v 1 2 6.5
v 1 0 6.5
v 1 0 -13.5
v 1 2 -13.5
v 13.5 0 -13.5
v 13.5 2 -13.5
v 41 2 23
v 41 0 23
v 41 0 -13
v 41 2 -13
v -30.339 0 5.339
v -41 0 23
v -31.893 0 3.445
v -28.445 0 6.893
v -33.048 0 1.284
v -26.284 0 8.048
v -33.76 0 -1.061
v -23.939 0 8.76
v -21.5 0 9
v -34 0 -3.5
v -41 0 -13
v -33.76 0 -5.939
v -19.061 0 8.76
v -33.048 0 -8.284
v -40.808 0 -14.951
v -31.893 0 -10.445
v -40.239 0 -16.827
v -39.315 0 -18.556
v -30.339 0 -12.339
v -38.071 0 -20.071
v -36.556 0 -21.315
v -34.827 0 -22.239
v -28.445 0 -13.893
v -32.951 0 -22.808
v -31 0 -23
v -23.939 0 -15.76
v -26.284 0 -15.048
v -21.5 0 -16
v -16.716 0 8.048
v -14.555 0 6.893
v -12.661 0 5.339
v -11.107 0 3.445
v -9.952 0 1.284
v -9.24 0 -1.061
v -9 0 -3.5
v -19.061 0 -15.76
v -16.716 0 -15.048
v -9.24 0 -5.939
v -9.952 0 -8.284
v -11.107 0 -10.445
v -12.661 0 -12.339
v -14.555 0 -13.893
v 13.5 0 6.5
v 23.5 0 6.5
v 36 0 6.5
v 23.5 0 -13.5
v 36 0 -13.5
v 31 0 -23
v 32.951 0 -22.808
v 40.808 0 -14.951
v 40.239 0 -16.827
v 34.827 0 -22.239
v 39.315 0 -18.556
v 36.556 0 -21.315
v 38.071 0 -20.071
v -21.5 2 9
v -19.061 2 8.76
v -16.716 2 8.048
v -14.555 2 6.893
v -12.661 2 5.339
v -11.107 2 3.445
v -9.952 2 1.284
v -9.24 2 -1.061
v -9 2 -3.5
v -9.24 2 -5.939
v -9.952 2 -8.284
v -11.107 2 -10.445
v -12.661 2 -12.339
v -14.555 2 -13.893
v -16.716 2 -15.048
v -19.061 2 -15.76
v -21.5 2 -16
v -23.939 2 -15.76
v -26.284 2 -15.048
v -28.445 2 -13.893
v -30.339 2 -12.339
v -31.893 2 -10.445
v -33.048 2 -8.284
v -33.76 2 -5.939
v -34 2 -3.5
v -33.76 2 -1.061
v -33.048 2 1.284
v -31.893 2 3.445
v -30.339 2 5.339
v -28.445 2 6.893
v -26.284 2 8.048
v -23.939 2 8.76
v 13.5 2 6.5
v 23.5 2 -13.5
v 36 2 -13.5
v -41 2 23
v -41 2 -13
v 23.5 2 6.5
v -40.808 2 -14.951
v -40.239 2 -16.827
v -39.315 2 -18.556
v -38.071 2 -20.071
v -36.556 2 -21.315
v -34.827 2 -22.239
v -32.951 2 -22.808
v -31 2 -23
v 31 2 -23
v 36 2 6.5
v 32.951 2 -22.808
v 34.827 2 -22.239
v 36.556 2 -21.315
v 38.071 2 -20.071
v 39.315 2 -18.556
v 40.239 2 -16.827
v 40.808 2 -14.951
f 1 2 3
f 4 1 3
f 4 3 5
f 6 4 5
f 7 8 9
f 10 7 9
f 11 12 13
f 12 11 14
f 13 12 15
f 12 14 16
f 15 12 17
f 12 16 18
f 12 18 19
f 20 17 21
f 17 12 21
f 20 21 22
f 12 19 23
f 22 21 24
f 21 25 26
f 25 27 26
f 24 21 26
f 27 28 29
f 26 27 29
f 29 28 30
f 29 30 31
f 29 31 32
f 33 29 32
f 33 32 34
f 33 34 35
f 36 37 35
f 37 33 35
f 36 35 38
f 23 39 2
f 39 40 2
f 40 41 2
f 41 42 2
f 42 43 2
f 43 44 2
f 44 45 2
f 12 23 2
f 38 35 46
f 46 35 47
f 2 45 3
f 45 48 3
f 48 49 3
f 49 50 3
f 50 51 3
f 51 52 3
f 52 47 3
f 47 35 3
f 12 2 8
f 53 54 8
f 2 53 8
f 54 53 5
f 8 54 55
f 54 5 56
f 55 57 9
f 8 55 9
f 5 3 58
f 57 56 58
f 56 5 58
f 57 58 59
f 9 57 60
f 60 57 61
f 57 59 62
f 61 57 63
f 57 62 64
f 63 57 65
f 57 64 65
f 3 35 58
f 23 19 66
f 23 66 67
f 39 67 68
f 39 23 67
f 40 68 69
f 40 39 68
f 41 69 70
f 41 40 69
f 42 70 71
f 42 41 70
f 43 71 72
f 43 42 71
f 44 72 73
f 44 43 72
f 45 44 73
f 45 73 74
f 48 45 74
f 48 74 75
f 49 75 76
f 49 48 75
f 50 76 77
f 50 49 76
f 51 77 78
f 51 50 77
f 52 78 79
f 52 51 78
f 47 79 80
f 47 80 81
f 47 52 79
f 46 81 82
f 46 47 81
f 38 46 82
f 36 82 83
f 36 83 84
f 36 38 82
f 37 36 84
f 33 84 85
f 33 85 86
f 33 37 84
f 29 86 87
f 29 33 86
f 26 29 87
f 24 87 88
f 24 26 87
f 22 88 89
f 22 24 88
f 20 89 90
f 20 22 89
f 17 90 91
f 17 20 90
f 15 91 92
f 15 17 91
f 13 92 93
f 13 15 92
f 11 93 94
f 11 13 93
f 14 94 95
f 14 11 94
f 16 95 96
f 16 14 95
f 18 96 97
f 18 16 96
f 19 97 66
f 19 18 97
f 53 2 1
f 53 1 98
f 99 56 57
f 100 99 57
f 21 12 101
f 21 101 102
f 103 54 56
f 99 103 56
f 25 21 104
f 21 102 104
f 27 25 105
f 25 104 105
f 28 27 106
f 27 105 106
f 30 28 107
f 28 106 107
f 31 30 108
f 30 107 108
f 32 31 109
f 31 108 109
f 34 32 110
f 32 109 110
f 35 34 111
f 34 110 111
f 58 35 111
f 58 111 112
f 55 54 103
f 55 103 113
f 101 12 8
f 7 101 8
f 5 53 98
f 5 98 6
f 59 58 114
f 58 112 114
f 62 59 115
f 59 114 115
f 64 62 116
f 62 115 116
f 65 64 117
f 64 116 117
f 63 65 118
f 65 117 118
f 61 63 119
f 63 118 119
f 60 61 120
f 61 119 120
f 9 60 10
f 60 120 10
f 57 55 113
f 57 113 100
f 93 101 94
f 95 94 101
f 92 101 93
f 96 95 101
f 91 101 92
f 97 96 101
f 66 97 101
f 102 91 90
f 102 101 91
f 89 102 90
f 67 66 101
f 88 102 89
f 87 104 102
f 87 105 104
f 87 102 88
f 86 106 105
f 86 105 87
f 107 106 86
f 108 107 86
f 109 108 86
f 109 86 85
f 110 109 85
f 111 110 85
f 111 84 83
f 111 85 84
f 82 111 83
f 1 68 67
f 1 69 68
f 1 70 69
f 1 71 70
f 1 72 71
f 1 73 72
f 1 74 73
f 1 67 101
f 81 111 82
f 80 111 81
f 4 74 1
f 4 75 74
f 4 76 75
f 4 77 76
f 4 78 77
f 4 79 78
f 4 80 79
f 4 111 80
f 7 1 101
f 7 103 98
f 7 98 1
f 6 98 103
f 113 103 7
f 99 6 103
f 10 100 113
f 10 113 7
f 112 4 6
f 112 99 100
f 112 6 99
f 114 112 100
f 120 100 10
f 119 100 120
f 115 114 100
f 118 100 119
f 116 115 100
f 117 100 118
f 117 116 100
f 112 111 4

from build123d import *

# Parameters (mm, degrees)
SKETCH_1_W      = 82
SKETCH_1_H      = 46
SKETCH_1_R      = 12.5
SKETCH_1_W_2    = 12.5
SKETCH_1_H_2    = 20
EXTRUDE_1_DEPTH = 2
FILLET_1_R      = 10


with BuildPart() as part:
    # 草图1 → 凸台-拉伸1 (new body)
    with BuildSketch(Plane(origin=(0, 0, 0), x_dir=(1, 0, 0), z_dir=(0, 1, 0))):
        Rectangle(SKETCH_1_W, SKETCH_1_H)
        with Locations(Location((-21.5, 3.5, 0), (0, 0, 270))):
            Circle(SKETCH_1_R, mode=Mode.SUBTRACT)
        with Locations((7.25, 3.5)):
            Rectangle(SKETCH_1_W_2, SKETCH_1_H_2, mode=Mode.SUBTRACT)
        with Locations((29.75, 3.5)):
            Rectangle(SKETCH_1_W_2, SKETCH_1_H_2, mode=Mode.SUBTRACT)
    extrude(amount=EXTRUDE_1_DEPTH)

    # 圆角1
    fillet_1_edges = [part.edges().sort_by_distance(p)[0] for p in [
        (-41, 1, -23),
        (41, 1, -23),
    ]]
    fillet(fillet_1_edges, radius=FILLET_1_R)


solid = part.part
